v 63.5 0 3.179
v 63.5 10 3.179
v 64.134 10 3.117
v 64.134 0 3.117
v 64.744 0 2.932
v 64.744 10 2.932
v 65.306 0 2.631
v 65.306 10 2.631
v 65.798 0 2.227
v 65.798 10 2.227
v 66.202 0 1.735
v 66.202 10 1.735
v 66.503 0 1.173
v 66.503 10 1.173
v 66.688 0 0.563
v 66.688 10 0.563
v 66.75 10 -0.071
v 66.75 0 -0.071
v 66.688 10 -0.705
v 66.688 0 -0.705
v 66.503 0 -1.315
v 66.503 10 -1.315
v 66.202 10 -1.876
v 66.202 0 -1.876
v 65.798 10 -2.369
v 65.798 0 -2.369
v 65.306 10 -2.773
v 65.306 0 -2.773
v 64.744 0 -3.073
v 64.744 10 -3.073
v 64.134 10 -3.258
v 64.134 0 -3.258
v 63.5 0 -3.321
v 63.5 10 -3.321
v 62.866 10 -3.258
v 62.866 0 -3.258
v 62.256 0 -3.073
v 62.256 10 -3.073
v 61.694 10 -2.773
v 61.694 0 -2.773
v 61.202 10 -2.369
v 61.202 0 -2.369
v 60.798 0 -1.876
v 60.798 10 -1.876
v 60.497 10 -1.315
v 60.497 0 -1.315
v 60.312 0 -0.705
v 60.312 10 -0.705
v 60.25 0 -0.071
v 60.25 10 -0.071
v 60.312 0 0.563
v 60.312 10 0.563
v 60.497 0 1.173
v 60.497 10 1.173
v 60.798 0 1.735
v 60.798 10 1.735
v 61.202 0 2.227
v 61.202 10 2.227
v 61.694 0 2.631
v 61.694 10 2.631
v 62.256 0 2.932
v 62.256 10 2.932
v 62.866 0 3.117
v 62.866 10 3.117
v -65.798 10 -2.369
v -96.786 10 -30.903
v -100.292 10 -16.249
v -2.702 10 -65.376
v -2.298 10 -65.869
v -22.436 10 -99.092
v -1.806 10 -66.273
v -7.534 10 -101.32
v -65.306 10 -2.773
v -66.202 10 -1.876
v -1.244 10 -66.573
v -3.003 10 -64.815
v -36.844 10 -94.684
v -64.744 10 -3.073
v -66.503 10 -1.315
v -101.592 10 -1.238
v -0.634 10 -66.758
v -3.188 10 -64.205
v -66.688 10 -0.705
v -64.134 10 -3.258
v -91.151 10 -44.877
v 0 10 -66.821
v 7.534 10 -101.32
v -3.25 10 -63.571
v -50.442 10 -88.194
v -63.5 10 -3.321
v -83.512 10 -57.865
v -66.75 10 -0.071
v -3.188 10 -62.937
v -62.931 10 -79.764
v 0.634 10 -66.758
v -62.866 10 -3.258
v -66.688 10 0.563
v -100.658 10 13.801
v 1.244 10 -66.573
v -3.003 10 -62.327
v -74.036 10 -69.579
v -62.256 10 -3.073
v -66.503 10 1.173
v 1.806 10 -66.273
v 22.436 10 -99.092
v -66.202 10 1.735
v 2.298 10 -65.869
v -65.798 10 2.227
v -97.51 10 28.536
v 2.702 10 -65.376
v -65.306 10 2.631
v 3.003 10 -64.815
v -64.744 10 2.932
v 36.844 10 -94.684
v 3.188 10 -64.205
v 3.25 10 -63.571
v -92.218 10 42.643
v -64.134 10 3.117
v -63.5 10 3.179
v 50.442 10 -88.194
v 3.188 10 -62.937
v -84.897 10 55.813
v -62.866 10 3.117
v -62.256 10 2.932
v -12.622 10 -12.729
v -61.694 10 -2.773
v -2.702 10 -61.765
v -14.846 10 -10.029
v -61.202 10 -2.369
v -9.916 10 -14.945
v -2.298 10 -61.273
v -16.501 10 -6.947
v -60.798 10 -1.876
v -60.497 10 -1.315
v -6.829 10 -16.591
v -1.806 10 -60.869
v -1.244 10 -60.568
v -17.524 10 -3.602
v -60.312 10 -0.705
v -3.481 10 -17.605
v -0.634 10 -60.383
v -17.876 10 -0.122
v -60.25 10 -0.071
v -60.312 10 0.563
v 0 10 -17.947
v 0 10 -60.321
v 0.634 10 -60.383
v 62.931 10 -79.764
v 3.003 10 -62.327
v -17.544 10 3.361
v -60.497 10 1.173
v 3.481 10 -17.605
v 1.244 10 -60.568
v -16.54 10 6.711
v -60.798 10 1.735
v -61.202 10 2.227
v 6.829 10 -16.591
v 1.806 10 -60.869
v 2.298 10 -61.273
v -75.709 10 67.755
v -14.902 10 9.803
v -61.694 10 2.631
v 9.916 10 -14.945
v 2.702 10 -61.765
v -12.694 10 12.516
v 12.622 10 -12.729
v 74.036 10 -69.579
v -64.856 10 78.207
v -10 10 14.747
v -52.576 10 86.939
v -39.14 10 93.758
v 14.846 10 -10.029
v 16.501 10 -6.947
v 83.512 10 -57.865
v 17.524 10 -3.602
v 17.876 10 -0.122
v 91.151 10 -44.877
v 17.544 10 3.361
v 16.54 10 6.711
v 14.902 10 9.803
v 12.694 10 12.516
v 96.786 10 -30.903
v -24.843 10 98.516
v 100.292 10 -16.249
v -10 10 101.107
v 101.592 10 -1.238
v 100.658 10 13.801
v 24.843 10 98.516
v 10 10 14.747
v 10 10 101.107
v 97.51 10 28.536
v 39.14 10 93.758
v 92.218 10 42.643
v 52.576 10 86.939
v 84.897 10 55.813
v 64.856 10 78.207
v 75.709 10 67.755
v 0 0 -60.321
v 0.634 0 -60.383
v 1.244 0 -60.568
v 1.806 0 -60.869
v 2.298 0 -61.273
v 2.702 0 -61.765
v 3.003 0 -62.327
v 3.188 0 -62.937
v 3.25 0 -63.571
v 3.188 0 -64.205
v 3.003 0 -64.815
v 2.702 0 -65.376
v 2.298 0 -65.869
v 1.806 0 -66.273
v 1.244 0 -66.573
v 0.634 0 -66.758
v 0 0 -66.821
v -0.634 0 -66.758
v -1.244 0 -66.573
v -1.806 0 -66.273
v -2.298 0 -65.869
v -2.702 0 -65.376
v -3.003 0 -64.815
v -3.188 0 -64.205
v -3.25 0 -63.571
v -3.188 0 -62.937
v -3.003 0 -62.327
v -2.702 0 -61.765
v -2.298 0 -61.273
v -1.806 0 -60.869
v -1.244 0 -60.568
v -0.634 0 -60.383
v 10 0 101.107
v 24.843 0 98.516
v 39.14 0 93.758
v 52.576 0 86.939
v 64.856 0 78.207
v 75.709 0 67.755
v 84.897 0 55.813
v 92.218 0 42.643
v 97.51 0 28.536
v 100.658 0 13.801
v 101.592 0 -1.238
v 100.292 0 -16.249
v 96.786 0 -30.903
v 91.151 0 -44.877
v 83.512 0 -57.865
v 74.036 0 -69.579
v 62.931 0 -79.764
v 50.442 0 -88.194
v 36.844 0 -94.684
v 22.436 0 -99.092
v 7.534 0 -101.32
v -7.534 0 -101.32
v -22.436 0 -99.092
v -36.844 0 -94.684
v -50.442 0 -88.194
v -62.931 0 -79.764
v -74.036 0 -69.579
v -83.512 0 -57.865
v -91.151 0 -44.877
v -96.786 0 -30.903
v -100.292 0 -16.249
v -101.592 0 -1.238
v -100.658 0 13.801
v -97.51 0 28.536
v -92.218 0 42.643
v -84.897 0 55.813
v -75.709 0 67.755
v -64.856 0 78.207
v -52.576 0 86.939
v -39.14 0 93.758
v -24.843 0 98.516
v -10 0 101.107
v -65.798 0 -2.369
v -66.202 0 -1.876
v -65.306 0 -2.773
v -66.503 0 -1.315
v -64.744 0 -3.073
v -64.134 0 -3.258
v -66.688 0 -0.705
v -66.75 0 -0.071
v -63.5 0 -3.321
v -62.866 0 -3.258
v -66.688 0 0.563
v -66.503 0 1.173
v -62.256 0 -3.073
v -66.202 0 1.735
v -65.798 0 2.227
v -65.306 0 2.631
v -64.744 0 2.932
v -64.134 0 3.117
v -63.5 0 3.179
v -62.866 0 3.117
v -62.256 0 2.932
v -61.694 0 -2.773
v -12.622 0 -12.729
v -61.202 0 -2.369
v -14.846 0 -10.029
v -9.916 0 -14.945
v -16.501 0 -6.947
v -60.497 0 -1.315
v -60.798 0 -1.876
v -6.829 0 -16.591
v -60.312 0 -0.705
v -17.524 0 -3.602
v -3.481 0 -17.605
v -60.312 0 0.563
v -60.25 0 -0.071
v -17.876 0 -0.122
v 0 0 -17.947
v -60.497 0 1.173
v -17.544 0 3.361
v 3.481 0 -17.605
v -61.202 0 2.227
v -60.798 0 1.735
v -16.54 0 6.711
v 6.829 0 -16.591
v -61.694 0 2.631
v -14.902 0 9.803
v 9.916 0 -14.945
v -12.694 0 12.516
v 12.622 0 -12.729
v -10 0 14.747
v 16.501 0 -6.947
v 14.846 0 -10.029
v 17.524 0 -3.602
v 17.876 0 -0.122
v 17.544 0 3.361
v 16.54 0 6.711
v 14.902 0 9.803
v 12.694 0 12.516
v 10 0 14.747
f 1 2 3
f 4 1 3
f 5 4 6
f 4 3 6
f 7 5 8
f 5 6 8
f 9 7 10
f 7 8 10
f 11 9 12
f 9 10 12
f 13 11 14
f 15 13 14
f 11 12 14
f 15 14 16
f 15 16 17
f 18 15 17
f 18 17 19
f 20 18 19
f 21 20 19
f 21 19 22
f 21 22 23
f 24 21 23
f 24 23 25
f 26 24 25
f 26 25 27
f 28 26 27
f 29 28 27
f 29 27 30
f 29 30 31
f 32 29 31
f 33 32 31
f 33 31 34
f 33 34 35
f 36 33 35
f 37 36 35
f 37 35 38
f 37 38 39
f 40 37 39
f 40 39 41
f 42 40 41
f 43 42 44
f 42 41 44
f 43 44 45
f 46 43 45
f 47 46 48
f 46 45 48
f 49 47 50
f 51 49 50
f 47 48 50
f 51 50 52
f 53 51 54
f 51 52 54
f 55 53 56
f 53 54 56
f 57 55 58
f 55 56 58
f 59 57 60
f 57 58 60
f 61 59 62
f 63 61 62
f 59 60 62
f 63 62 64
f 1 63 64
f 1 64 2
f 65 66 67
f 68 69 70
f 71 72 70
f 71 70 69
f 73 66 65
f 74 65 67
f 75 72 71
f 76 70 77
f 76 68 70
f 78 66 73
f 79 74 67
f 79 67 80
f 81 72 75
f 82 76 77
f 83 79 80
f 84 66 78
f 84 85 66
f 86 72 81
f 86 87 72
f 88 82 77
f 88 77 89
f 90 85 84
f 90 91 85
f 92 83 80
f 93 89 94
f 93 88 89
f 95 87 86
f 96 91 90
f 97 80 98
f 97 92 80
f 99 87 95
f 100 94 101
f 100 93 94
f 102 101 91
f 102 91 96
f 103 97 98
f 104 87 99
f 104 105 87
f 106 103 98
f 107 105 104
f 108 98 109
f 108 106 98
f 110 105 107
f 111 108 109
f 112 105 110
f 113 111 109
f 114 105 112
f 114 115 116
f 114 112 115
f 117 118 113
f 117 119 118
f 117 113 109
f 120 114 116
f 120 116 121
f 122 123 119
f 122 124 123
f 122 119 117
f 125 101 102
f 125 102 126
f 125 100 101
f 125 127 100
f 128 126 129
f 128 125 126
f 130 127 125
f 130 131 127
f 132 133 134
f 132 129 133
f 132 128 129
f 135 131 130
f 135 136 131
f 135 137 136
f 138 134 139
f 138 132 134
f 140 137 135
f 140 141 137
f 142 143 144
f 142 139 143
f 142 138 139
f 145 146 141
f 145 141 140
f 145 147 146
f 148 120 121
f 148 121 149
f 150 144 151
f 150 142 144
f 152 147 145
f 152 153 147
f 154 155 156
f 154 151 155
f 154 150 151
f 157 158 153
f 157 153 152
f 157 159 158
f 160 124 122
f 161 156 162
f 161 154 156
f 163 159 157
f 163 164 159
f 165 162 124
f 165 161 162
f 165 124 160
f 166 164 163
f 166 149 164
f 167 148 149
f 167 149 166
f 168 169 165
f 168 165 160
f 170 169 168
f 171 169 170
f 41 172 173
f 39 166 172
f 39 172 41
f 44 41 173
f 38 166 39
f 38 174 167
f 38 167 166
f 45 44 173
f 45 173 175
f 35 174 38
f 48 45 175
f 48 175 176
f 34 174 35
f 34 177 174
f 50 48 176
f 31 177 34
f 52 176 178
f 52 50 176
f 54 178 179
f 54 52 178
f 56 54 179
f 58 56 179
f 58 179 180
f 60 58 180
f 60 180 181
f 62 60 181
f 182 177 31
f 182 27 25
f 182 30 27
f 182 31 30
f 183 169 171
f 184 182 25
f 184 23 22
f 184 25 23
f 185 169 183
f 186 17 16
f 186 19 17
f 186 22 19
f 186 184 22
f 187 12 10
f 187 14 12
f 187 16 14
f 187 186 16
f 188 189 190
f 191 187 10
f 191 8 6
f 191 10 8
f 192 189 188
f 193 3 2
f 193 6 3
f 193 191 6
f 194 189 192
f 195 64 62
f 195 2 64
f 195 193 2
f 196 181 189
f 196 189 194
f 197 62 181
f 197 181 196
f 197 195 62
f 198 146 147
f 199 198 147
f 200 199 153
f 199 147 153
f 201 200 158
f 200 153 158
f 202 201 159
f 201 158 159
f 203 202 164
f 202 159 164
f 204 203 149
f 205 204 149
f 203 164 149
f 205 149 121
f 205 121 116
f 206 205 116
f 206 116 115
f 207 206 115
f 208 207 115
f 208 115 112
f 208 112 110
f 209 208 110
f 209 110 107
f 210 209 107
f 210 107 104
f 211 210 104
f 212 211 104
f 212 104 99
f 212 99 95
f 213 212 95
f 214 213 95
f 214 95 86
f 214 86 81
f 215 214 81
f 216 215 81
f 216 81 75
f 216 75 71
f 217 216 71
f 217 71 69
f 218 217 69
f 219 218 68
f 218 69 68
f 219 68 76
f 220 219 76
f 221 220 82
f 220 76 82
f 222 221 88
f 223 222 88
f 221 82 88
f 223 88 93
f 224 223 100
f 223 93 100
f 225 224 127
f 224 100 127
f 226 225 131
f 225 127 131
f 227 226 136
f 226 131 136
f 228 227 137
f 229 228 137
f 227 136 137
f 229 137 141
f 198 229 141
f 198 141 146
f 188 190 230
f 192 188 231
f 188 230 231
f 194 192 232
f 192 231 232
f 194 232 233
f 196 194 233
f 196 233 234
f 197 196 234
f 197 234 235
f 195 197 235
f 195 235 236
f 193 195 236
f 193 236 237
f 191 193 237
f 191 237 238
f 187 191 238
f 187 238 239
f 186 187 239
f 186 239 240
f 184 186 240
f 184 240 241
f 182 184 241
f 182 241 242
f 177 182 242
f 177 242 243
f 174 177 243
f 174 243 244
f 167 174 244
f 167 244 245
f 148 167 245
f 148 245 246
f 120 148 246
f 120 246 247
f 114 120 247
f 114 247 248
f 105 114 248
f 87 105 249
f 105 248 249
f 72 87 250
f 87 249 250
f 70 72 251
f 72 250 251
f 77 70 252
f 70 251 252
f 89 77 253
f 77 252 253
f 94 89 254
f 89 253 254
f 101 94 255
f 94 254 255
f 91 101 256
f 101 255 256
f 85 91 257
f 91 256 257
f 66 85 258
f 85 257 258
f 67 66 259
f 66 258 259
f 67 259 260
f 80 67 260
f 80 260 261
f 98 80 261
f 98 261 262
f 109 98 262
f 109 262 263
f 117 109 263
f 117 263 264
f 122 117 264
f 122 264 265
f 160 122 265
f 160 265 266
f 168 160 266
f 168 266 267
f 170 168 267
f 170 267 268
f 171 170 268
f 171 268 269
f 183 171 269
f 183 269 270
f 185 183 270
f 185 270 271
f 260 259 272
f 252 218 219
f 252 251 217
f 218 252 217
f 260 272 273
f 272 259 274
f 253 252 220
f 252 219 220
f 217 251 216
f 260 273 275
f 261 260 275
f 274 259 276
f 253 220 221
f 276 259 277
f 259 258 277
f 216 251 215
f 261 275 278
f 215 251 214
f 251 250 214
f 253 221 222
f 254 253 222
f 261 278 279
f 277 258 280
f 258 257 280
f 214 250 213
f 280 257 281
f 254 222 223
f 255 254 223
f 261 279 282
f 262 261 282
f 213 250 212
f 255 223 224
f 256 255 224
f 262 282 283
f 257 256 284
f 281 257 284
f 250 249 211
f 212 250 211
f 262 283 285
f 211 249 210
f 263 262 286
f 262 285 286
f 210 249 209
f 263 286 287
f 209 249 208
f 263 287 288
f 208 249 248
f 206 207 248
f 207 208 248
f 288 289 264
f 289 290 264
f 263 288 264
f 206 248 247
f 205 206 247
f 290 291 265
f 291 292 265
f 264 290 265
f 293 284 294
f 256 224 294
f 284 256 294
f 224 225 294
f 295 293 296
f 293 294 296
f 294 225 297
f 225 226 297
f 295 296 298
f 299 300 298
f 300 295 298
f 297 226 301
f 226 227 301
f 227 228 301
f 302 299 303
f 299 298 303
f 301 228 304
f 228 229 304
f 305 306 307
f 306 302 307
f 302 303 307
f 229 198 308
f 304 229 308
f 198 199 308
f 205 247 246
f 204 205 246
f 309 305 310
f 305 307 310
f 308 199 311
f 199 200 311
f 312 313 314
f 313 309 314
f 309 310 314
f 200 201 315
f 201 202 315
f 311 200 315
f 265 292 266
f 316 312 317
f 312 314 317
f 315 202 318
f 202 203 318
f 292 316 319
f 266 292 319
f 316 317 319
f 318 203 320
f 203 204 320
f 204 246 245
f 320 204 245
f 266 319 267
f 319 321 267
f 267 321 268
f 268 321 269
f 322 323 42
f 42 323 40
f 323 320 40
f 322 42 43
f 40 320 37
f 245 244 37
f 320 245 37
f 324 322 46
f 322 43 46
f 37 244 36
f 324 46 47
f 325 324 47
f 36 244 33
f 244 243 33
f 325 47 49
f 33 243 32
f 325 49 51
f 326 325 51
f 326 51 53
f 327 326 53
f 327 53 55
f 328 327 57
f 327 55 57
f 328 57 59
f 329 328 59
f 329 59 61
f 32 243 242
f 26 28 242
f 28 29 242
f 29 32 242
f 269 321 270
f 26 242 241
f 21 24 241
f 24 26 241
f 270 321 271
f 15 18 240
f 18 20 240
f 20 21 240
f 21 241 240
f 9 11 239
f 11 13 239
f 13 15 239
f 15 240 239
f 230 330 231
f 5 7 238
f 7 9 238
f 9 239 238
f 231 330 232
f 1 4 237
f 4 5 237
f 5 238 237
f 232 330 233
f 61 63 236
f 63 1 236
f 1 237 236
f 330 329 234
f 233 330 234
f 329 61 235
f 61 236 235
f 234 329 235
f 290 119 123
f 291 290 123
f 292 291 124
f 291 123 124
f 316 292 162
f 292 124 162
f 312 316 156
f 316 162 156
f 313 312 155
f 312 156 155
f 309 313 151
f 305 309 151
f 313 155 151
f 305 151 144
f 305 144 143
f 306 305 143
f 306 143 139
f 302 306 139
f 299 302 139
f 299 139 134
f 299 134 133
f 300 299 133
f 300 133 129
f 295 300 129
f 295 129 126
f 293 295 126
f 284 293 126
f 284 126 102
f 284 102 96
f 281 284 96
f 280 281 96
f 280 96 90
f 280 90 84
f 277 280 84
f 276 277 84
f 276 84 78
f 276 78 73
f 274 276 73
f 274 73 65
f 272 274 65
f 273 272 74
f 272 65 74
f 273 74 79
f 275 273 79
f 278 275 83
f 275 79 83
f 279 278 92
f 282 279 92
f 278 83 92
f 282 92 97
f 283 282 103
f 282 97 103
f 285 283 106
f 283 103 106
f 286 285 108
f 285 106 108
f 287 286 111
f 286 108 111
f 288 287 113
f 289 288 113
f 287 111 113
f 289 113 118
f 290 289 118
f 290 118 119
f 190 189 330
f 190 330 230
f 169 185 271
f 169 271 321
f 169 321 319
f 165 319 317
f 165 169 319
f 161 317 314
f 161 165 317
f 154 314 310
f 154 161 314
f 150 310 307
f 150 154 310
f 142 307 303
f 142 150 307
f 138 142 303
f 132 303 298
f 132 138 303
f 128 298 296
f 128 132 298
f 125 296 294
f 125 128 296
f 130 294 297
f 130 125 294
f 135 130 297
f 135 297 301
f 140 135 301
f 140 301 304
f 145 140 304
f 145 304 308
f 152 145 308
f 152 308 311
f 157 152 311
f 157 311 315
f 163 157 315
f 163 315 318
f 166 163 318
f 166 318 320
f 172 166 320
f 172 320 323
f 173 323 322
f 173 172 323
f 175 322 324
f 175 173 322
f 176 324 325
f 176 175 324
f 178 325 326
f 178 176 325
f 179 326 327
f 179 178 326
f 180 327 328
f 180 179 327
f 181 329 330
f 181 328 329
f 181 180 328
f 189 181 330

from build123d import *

# Parameters (mm, degrees)
SKETCH1_R           = 101.6
BOSS_EXTRUDE1_DEPTH = 10
SKETCH2_R           = 3.25
CUT_EXTRUDE1_DEPTH  = 145.031663186


with BuildPart() as part:
    # Sketch1 → Boss-Extrude1 (new body)
    with BuildSketch(Plane(origin=(0, 0, 0), x_dir=(1, 0, 0), z_dir=(0, 1, 0))):
        with Locations(Location((0, 0, 0), (0, 0, 270))):
            Circle(SKETCH1_R)
    extrude(amount=BOSS_EXTRUDE1_DEPTH)

    # Sketch2 → Cut-Extrude1 (cut, through all)
    with BuildSketch(Plane(origin=(0, 10, 0), x_dir=(1, 0, 0), z_dir=(0, 1, 0))):
        with Locations(Location((63.5, 0.070795045, 0), (0, 0, 270))):
            Circle(SKETCH2_R)
        with Locations(Location((-63.5, 0.070795045, 0), (0, 0, 270))):
            Circle(SKETCH2_R)
        with Locations(Location((0, 63.570795045, 0), (0, 0, 270))):
            Circle(SKETCH2_R)
        with BuildLine():
            Line((10, -14.746676337), (10, -101.106676337))
            ThreePointArc((10, -101.106676337), (0, -101.6), (-10, -101.106676337))
            Line((-10, -101.106676337), (-10, -14.746676337))
            ThreePointArc((-10, -14.746676337), (0, 17.946965165), (10, -14.746676337))
        make_face()
    extrude(amount=-CUT_EXTRUDE1_DEPTH, mode=Mode.SUBTRACT)


solid = part.part
